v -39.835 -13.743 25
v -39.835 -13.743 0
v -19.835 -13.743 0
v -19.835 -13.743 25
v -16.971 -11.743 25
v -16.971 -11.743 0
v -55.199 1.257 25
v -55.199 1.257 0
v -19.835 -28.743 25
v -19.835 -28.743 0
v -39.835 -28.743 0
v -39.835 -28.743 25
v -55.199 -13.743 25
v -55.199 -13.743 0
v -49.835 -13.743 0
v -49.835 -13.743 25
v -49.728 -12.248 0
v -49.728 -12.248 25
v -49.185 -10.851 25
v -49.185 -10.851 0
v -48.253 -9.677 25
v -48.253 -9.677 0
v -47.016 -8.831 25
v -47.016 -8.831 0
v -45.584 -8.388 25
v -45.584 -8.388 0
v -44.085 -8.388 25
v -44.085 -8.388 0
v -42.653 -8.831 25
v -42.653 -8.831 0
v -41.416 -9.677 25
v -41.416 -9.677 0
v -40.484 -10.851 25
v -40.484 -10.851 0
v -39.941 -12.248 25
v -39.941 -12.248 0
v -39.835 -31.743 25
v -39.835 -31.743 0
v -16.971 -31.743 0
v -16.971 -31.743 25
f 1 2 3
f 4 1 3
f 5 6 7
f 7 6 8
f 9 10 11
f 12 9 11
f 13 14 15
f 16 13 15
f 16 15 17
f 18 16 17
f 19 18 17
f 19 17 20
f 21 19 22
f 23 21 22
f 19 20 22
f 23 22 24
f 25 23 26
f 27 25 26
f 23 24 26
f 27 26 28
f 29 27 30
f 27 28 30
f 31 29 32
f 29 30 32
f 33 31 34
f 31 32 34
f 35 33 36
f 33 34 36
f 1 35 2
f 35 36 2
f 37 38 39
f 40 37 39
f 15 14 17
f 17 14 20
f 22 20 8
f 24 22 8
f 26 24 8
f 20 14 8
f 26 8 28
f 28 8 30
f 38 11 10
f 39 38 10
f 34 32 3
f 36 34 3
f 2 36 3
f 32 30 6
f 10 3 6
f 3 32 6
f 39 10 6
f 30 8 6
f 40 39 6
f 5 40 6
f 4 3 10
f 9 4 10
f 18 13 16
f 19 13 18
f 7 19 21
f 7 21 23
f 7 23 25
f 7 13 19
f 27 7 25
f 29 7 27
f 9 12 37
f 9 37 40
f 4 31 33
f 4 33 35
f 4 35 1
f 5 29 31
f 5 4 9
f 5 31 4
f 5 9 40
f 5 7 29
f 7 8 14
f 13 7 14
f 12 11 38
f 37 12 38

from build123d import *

# Parameters (mm, degrees)
F1_DEPTH = 25


with BuildPart() as f1:
    # F0 (on Top) → F1 (new body)
    with BuildSketch(Plane.XY):
        with BuildLine():
            ThreePointArc((-49.834719, -13.743161), (-44.834719, -8.331543), (-39.834719, -13.743161))
            Line((-39.834719, -13.743161), (-19.834719, -13.743161))
            Line((-19.834719, -13.743161), (-19.834719, -28.743161))
            Line((-19.834719, -28.743161), (-39.834719, -28.743161))
            Line((-39.834719, -28.743161), (-39.834719, -31.743161))
            Line((-39.834719, -31.743161), (-19.971046, -31.743161))
            Line((-19.971046, -31.743161), (-16.971046, -31.743161))
            Line((-16.971046, -31.743161), (-16.971046, -11.743161))
            Line((-16.971046, -11.743161), (-55.198664, 1.256839))
            Line((-55.198664, 1.256839), (-55.198664, -13.743161))
            Line((-55.198664, -13.743161), (-49.834719, -13.743161))
        make_face()
    extrude(amount=F1_DEPTH)


solid = f1.part
